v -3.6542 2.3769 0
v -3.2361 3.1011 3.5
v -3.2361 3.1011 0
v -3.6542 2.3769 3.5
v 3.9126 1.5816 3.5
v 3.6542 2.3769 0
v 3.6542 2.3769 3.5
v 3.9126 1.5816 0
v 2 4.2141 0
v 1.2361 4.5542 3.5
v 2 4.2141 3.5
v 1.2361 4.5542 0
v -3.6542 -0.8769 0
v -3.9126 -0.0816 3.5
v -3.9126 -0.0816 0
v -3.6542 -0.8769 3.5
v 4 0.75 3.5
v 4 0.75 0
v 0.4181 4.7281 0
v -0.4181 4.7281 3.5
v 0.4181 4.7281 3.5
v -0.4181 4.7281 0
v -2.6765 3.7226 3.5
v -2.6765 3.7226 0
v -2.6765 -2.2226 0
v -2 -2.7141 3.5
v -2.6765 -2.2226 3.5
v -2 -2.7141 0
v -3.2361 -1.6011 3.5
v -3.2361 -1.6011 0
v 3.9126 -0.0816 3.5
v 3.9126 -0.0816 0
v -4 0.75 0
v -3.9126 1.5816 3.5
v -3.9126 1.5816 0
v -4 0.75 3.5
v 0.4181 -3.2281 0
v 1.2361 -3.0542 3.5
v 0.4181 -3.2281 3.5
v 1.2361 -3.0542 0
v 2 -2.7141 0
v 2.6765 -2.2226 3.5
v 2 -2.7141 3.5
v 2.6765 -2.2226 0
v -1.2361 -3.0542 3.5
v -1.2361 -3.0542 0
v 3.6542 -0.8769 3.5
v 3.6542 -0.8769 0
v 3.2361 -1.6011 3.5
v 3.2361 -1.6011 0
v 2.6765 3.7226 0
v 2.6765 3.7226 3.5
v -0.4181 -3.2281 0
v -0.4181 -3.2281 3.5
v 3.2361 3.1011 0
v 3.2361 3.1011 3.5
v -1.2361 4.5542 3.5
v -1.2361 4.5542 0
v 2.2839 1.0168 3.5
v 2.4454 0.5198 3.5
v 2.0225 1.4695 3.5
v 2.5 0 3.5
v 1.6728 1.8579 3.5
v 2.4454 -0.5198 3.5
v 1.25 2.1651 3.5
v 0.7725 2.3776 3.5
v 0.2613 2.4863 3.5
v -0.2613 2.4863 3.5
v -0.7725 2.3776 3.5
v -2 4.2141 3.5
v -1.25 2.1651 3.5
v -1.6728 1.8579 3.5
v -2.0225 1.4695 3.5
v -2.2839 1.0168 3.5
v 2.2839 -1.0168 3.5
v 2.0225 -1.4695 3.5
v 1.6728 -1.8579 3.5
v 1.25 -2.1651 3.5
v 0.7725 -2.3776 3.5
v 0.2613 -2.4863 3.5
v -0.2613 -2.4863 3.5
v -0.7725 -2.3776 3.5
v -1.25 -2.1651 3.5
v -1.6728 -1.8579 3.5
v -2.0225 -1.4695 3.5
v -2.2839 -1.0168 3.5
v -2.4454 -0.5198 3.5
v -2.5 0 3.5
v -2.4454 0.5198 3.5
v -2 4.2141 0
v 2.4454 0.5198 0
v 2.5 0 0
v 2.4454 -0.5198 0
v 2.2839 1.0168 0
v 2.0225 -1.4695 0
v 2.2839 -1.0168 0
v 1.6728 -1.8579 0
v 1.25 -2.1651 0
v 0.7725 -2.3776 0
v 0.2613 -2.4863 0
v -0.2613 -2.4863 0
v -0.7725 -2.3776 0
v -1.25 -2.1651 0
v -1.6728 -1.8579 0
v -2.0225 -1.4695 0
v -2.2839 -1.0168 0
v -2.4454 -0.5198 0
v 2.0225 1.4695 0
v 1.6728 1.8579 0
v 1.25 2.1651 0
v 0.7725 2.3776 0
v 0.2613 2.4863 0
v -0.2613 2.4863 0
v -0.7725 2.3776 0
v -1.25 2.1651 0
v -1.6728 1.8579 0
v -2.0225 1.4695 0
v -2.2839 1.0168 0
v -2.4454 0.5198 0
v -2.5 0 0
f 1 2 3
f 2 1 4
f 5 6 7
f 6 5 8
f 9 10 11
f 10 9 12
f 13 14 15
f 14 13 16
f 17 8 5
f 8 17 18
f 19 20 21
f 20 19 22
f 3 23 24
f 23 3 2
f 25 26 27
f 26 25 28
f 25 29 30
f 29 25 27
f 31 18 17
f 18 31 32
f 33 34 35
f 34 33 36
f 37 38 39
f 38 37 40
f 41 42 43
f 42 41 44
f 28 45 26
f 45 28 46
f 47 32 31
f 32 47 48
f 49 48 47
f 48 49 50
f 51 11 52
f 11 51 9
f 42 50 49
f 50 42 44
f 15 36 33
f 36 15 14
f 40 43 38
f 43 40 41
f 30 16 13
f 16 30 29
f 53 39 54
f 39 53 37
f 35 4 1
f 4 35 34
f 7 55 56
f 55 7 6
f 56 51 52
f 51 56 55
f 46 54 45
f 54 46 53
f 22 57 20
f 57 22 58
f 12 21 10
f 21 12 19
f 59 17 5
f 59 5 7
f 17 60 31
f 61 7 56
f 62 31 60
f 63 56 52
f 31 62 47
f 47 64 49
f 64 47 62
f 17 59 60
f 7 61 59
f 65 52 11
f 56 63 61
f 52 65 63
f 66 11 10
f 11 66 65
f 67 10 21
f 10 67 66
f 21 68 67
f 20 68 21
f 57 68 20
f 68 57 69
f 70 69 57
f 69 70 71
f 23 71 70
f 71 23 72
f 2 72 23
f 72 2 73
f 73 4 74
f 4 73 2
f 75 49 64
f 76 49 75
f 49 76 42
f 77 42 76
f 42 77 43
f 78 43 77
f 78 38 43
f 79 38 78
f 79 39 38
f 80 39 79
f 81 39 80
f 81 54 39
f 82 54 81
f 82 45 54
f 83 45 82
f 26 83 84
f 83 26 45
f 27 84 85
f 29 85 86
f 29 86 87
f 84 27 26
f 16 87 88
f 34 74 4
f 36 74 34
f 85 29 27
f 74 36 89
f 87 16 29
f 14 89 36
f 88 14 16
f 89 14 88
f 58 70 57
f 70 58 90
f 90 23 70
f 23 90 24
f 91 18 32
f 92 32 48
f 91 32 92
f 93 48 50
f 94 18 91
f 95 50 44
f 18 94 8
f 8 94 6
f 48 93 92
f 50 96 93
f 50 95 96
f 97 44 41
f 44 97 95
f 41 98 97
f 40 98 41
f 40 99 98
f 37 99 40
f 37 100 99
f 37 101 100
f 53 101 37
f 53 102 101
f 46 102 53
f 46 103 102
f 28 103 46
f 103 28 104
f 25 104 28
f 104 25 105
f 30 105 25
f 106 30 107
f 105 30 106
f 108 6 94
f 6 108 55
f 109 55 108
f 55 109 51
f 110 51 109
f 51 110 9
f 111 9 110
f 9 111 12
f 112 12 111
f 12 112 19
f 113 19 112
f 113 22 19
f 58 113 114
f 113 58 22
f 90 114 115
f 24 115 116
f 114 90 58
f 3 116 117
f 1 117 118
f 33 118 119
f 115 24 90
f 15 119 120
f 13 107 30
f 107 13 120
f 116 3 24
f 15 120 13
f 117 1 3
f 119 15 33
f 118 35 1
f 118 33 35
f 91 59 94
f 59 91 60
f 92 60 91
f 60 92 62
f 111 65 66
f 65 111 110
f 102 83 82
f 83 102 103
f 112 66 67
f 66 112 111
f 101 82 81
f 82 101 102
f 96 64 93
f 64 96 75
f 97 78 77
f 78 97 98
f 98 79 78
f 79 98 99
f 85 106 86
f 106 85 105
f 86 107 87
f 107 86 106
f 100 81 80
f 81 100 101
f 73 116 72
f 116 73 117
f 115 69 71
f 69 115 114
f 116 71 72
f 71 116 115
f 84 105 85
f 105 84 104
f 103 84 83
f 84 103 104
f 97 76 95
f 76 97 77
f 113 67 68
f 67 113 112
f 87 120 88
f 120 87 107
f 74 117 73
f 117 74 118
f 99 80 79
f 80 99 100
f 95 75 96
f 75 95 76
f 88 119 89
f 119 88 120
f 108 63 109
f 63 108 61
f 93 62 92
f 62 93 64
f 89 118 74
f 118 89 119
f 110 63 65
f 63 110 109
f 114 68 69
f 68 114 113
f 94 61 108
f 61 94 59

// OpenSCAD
// file: ../lib/user.scad
module center_cylinder(r,h) {
    translate([0, 0, h>0?0:h]) {        
        linear_extrude(height=h>0?h:-h) {
            circle(r=r);
        }
    }
}

module cut_square(cut,size, center=true) {
    offset(delta=cut,chamfer=true)
            square(size-cut*2, center);
}
// file: ../param.scad
motor_size = 42;
motor_hole_size = 31;

cycloidal_diameter = 36;
cycloidal_out_diameter = 21;
cycloidal_out_roller_num = 6;

cycloidal_roller_diameter = 3;
cycloidal_roller_height = 8;
cycloidal_roller_num = 21;
cycloidal_rotor_height = 4;
cycloidal_e = 0.75;

print_delta = 0.1;
// file: ../part/eccentric.scad
include <../param.scad>;
include <../lib/user.scad>;

module part_eccentric() {
    h=3.5;
    $fs = 0.2;
    difference() {
        translate([0,cycloidal_e,0])
            center_cylinder(r=8/2, h=h);
        translate([0,0,-0.05])
            center_cylinder(r=5/2, h=h+0.1);
    }
}
// main file
include <../part/eccentric.scad>

$fs = 0.05;
part_eccentric();
